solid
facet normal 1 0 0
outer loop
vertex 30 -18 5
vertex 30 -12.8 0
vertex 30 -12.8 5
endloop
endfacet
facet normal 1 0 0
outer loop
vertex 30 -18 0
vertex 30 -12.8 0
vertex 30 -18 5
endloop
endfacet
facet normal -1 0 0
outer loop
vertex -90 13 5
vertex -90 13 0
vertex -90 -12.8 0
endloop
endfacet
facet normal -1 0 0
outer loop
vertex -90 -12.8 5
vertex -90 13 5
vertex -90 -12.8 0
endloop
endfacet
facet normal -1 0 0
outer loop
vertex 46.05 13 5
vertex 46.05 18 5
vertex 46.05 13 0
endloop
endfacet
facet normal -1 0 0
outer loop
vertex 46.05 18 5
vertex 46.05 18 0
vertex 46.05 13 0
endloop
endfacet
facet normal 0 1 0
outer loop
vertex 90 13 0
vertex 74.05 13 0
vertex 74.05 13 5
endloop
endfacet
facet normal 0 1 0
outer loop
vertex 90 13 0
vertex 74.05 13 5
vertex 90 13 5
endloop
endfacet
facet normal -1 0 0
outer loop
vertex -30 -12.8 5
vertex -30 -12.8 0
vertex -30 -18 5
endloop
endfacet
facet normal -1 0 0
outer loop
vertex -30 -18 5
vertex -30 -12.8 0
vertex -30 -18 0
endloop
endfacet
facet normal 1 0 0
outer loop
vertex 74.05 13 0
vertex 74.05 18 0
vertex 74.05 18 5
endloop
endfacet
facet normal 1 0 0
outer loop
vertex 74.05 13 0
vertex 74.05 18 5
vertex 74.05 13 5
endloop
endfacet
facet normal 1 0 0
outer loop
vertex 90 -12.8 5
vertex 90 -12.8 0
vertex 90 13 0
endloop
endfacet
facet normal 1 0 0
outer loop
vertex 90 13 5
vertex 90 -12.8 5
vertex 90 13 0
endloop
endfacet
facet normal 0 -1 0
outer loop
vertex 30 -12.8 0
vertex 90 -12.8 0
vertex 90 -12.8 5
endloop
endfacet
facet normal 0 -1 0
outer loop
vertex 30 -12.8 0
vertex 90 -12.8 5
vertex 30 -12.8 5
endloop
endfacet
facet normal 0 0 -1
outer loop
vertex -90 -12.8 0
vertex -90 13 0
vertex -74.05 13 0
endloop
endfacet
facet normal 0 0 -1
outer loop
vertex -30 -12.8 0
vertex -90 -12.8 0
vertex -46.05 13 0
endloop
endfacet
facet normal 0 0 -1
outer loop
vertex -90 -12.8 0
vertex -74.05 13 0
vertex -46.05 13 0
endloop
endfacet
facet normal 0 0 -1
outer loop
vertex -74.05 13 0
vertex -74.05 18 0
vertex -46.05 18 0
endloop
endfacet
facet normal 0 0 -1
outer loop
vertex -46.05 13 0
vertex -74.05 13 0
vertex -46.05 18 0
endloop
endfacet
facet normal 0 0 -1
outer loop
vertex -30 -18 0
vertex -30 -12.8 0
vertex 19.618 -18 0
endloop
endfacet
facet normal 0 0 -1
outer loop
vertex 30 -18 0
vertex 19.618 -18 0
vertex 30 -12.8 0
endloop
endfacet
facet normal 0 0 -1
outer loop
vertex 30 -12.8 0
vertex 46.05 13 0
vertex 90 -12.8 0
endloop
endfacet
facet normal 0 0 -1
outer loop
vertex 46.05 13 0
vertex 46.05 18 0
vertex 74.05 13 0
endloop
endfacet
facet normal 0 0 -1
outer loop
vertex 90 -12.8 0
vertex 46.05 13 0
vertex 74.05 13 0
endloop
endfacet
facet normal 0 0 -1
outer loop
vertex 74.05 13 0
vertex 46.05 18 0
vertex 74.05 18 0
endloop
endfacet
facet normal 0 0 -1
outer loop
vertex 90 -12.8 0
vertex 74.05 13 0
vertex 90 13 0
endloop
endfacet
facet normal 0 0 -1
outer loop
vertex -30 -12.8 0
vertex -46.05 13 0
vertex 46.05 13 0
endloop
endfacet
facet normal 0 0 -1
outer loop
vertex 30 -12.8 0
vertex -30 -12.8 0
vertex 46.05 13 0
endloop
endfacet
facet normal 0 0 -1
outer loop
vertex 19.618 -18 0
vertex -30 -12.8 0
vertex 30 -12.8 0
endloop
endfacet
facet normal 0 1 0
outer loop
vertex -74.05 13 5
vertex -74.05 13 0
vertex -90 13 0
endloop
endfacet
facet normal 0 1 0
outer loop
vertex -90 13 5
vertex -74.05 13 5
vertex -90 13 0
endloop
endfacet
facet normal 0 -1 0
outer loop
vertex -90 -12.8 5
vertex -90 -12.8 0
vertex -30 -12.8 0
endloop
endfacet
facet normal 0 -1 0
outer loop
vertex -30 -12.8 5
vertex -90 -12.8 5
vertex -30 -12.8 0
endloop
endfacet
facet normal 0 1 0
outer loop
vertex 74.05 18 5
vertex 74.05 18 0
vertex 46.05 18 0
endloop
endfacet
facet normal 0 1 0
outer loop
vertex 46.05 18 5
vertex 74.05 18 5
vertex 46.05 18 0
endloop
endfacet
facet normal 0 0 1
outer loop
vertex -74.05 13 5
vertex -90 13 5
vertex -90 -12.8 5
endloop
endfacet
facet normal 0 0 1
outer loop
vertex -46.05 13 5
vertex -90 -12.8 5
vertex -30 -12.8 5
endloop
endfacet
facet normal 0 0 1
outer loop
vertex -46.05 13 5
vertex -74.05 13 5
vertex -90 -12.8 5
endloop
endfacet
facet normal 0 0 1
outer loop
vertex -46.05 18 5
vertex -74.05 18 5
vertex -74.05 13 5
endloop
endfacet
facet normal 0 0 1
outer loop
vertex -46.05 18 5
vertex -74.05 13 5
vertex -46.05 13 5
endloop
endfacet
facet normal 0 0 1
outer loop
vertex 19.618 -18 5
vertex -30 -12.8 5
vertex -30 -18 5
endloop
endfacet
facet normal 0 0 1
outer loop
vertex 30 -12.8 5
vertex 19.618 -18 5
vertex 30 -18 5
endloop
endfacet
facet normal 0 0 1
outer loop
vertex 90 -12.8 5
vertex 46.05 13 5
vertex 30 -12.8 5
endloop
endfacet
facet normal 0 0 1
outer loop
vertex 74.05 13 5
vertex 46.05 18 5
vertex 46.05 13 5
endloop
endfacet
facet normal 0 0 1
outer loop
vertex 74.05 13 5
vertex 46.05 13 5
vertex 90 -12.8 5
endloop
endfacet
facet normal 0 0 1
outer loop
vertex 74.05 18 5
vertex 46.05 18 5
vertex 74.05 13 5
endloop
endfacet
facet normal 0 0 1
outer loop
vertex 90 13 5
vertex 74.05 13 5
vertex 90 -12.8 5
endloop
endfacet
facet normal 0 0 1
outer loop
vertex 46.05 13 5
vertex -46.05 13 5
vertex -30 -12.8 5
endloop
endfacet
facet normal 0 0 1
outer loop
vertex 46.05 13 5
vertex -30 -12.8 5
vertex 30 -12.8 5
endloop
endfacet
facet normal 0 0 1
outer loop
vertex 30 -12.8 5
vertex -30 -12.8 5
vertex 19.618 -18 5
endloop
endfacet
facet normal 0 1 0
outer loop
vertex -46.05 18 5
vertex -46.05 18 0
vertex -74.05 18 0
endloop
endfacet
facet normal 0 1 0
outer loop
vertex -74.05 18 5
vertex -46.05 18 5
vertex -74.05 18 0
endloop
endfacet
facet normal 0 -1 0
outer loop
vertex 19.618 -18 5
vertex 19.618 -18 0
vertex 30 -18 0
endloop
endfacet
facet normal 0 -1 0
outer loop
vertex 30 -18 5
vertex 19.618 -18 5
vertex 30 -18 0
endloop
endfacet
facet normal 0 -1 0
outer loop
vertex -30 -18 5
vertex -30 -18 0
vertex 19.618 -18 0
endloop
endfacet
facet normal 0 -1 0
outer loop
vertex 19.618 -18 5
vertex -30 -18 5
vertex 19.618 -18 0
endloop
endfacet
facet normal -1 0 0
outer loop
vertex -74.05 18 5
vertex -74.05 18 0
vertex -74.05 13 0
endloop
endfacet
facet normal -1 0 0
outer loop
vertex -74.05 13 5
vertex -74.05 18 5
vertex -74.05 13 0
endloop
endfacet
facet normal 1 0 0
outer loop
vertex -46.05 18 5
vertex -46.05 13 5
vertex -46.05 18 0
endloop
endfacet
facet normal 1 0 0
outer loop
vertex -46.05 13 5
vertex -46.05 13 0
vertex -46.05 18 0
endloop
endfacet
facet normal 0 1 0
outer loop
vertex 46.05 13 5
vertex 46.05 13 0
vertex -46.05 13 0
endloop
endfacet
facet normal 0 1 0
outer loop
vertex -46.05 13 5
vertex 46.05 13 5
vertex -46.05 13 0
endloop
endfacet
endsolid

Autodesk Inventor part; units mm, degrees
ref_plane "YZ Plane" through (0, 0, 0) normal (1, 0, 0) x (0, 1, 0)
ref_plane "XZ Plane" through (0, 0, 0) normal (0, 1, 0) x (-1, 0, 0)
ref_plane "XY Plane" through (0, 0, 0) normal (0, 0, 1) x (1, 0, 0)
sketch "Sketch1" plane through (0, 0, 0) normal (0, 0, 1) x (1, 0, 0)
  line L0 (-90, -18) -> (90, -18)
  line L1 (90, -18) -> (90, 18)
  line L2 (90, 18) -> (-90, 18)
  line L3 (-90, 18) -> (-90, -18)
  line L4 (-90, -18) -> (90, 18) construction
  line L5 (90, -18) -> (-90, 18) construction
  line L6 (-46.05, 18) -> (46.05, 18)
  line L7 (46.05, 18) -> (46.05, 13)
  line L8 (46.05, 13) -> (-46.05, 13)
  line L9 (-46.05, 13) -> (-46.05, 18)
  line L10 (-46.05, 18) -> (46.05, 13) construction
  line L11 (46.05, 18) -> (-46.05, 13) construction
  line L12 (-90, -12.8) -> (-30, -12.8)
  line L13 (-30, -12.8) -> (-30, -18)
  line L14 (-30, -18) -> (-90, -18)
  line L15 (-90, -18) -> (-90, -12.8)
  line L16 (-90, -12.8) -> (-30, -18) construction
  line L17 (-30, -12.8) -> (-90, -18) construction
  line L18 (19.6182, -18) -> (70, -18)
  line L19 (0, 0) -> (0, -18) construction
  line L20 (30, -18) -> (90, -18)
  line L21 (90, -18) -> (90, -12.8)
  line L22 (90, -12.8) -> (30, -12.8)
  line L23 (30, -12.8) -> (30, -18)
  line L24 (30, -18) -> (90, -12.8) construction
  line L25 (90, -18) -> (30, -12.8) construction
  line L26 (-45.85, 18) -> (-74.05, 18)
  line L27 (74.05, 18) -> (74.05, 13)
  line L28 (74.05, 13) -> (90, 13)
  line L29 (-74.05, 18) -> (-74.05, 13)
  line L30 (-74.05, 13) -> (-90, 13)
  point P0 (0, 15.5)
  point P1 (-60, -15.4)
  point P2 (46.05, 18)
  point P3 (-46.05, 18)
  point P4 (-30, -18)
  point P5 (-90, -12.8)
  point P6 (60, -15.4)
  point P7 (30, -18)
  point P8 (-74.05, 18)
  dimension "d0" = 180
  dimension "d1" = 36
  dimension "d10" = 5
  dimension "d11" = 92.1
  dimension "d12" = 5.2
  dimension "d21" = 5.2
  dimension "d24" = 60
  dimension "d31" = 28
  dimension "d32" = 28
extrude "Extrusion1" add sketch "Sketch1" along normal blind 5 contours L13 L12 L3 L30 L29 L2 L9 L8 L7 L27 L28 L1 L22 L23 L0
equation "\"d32\" = d31"
properties part number "lower-front-back-plate-support"
